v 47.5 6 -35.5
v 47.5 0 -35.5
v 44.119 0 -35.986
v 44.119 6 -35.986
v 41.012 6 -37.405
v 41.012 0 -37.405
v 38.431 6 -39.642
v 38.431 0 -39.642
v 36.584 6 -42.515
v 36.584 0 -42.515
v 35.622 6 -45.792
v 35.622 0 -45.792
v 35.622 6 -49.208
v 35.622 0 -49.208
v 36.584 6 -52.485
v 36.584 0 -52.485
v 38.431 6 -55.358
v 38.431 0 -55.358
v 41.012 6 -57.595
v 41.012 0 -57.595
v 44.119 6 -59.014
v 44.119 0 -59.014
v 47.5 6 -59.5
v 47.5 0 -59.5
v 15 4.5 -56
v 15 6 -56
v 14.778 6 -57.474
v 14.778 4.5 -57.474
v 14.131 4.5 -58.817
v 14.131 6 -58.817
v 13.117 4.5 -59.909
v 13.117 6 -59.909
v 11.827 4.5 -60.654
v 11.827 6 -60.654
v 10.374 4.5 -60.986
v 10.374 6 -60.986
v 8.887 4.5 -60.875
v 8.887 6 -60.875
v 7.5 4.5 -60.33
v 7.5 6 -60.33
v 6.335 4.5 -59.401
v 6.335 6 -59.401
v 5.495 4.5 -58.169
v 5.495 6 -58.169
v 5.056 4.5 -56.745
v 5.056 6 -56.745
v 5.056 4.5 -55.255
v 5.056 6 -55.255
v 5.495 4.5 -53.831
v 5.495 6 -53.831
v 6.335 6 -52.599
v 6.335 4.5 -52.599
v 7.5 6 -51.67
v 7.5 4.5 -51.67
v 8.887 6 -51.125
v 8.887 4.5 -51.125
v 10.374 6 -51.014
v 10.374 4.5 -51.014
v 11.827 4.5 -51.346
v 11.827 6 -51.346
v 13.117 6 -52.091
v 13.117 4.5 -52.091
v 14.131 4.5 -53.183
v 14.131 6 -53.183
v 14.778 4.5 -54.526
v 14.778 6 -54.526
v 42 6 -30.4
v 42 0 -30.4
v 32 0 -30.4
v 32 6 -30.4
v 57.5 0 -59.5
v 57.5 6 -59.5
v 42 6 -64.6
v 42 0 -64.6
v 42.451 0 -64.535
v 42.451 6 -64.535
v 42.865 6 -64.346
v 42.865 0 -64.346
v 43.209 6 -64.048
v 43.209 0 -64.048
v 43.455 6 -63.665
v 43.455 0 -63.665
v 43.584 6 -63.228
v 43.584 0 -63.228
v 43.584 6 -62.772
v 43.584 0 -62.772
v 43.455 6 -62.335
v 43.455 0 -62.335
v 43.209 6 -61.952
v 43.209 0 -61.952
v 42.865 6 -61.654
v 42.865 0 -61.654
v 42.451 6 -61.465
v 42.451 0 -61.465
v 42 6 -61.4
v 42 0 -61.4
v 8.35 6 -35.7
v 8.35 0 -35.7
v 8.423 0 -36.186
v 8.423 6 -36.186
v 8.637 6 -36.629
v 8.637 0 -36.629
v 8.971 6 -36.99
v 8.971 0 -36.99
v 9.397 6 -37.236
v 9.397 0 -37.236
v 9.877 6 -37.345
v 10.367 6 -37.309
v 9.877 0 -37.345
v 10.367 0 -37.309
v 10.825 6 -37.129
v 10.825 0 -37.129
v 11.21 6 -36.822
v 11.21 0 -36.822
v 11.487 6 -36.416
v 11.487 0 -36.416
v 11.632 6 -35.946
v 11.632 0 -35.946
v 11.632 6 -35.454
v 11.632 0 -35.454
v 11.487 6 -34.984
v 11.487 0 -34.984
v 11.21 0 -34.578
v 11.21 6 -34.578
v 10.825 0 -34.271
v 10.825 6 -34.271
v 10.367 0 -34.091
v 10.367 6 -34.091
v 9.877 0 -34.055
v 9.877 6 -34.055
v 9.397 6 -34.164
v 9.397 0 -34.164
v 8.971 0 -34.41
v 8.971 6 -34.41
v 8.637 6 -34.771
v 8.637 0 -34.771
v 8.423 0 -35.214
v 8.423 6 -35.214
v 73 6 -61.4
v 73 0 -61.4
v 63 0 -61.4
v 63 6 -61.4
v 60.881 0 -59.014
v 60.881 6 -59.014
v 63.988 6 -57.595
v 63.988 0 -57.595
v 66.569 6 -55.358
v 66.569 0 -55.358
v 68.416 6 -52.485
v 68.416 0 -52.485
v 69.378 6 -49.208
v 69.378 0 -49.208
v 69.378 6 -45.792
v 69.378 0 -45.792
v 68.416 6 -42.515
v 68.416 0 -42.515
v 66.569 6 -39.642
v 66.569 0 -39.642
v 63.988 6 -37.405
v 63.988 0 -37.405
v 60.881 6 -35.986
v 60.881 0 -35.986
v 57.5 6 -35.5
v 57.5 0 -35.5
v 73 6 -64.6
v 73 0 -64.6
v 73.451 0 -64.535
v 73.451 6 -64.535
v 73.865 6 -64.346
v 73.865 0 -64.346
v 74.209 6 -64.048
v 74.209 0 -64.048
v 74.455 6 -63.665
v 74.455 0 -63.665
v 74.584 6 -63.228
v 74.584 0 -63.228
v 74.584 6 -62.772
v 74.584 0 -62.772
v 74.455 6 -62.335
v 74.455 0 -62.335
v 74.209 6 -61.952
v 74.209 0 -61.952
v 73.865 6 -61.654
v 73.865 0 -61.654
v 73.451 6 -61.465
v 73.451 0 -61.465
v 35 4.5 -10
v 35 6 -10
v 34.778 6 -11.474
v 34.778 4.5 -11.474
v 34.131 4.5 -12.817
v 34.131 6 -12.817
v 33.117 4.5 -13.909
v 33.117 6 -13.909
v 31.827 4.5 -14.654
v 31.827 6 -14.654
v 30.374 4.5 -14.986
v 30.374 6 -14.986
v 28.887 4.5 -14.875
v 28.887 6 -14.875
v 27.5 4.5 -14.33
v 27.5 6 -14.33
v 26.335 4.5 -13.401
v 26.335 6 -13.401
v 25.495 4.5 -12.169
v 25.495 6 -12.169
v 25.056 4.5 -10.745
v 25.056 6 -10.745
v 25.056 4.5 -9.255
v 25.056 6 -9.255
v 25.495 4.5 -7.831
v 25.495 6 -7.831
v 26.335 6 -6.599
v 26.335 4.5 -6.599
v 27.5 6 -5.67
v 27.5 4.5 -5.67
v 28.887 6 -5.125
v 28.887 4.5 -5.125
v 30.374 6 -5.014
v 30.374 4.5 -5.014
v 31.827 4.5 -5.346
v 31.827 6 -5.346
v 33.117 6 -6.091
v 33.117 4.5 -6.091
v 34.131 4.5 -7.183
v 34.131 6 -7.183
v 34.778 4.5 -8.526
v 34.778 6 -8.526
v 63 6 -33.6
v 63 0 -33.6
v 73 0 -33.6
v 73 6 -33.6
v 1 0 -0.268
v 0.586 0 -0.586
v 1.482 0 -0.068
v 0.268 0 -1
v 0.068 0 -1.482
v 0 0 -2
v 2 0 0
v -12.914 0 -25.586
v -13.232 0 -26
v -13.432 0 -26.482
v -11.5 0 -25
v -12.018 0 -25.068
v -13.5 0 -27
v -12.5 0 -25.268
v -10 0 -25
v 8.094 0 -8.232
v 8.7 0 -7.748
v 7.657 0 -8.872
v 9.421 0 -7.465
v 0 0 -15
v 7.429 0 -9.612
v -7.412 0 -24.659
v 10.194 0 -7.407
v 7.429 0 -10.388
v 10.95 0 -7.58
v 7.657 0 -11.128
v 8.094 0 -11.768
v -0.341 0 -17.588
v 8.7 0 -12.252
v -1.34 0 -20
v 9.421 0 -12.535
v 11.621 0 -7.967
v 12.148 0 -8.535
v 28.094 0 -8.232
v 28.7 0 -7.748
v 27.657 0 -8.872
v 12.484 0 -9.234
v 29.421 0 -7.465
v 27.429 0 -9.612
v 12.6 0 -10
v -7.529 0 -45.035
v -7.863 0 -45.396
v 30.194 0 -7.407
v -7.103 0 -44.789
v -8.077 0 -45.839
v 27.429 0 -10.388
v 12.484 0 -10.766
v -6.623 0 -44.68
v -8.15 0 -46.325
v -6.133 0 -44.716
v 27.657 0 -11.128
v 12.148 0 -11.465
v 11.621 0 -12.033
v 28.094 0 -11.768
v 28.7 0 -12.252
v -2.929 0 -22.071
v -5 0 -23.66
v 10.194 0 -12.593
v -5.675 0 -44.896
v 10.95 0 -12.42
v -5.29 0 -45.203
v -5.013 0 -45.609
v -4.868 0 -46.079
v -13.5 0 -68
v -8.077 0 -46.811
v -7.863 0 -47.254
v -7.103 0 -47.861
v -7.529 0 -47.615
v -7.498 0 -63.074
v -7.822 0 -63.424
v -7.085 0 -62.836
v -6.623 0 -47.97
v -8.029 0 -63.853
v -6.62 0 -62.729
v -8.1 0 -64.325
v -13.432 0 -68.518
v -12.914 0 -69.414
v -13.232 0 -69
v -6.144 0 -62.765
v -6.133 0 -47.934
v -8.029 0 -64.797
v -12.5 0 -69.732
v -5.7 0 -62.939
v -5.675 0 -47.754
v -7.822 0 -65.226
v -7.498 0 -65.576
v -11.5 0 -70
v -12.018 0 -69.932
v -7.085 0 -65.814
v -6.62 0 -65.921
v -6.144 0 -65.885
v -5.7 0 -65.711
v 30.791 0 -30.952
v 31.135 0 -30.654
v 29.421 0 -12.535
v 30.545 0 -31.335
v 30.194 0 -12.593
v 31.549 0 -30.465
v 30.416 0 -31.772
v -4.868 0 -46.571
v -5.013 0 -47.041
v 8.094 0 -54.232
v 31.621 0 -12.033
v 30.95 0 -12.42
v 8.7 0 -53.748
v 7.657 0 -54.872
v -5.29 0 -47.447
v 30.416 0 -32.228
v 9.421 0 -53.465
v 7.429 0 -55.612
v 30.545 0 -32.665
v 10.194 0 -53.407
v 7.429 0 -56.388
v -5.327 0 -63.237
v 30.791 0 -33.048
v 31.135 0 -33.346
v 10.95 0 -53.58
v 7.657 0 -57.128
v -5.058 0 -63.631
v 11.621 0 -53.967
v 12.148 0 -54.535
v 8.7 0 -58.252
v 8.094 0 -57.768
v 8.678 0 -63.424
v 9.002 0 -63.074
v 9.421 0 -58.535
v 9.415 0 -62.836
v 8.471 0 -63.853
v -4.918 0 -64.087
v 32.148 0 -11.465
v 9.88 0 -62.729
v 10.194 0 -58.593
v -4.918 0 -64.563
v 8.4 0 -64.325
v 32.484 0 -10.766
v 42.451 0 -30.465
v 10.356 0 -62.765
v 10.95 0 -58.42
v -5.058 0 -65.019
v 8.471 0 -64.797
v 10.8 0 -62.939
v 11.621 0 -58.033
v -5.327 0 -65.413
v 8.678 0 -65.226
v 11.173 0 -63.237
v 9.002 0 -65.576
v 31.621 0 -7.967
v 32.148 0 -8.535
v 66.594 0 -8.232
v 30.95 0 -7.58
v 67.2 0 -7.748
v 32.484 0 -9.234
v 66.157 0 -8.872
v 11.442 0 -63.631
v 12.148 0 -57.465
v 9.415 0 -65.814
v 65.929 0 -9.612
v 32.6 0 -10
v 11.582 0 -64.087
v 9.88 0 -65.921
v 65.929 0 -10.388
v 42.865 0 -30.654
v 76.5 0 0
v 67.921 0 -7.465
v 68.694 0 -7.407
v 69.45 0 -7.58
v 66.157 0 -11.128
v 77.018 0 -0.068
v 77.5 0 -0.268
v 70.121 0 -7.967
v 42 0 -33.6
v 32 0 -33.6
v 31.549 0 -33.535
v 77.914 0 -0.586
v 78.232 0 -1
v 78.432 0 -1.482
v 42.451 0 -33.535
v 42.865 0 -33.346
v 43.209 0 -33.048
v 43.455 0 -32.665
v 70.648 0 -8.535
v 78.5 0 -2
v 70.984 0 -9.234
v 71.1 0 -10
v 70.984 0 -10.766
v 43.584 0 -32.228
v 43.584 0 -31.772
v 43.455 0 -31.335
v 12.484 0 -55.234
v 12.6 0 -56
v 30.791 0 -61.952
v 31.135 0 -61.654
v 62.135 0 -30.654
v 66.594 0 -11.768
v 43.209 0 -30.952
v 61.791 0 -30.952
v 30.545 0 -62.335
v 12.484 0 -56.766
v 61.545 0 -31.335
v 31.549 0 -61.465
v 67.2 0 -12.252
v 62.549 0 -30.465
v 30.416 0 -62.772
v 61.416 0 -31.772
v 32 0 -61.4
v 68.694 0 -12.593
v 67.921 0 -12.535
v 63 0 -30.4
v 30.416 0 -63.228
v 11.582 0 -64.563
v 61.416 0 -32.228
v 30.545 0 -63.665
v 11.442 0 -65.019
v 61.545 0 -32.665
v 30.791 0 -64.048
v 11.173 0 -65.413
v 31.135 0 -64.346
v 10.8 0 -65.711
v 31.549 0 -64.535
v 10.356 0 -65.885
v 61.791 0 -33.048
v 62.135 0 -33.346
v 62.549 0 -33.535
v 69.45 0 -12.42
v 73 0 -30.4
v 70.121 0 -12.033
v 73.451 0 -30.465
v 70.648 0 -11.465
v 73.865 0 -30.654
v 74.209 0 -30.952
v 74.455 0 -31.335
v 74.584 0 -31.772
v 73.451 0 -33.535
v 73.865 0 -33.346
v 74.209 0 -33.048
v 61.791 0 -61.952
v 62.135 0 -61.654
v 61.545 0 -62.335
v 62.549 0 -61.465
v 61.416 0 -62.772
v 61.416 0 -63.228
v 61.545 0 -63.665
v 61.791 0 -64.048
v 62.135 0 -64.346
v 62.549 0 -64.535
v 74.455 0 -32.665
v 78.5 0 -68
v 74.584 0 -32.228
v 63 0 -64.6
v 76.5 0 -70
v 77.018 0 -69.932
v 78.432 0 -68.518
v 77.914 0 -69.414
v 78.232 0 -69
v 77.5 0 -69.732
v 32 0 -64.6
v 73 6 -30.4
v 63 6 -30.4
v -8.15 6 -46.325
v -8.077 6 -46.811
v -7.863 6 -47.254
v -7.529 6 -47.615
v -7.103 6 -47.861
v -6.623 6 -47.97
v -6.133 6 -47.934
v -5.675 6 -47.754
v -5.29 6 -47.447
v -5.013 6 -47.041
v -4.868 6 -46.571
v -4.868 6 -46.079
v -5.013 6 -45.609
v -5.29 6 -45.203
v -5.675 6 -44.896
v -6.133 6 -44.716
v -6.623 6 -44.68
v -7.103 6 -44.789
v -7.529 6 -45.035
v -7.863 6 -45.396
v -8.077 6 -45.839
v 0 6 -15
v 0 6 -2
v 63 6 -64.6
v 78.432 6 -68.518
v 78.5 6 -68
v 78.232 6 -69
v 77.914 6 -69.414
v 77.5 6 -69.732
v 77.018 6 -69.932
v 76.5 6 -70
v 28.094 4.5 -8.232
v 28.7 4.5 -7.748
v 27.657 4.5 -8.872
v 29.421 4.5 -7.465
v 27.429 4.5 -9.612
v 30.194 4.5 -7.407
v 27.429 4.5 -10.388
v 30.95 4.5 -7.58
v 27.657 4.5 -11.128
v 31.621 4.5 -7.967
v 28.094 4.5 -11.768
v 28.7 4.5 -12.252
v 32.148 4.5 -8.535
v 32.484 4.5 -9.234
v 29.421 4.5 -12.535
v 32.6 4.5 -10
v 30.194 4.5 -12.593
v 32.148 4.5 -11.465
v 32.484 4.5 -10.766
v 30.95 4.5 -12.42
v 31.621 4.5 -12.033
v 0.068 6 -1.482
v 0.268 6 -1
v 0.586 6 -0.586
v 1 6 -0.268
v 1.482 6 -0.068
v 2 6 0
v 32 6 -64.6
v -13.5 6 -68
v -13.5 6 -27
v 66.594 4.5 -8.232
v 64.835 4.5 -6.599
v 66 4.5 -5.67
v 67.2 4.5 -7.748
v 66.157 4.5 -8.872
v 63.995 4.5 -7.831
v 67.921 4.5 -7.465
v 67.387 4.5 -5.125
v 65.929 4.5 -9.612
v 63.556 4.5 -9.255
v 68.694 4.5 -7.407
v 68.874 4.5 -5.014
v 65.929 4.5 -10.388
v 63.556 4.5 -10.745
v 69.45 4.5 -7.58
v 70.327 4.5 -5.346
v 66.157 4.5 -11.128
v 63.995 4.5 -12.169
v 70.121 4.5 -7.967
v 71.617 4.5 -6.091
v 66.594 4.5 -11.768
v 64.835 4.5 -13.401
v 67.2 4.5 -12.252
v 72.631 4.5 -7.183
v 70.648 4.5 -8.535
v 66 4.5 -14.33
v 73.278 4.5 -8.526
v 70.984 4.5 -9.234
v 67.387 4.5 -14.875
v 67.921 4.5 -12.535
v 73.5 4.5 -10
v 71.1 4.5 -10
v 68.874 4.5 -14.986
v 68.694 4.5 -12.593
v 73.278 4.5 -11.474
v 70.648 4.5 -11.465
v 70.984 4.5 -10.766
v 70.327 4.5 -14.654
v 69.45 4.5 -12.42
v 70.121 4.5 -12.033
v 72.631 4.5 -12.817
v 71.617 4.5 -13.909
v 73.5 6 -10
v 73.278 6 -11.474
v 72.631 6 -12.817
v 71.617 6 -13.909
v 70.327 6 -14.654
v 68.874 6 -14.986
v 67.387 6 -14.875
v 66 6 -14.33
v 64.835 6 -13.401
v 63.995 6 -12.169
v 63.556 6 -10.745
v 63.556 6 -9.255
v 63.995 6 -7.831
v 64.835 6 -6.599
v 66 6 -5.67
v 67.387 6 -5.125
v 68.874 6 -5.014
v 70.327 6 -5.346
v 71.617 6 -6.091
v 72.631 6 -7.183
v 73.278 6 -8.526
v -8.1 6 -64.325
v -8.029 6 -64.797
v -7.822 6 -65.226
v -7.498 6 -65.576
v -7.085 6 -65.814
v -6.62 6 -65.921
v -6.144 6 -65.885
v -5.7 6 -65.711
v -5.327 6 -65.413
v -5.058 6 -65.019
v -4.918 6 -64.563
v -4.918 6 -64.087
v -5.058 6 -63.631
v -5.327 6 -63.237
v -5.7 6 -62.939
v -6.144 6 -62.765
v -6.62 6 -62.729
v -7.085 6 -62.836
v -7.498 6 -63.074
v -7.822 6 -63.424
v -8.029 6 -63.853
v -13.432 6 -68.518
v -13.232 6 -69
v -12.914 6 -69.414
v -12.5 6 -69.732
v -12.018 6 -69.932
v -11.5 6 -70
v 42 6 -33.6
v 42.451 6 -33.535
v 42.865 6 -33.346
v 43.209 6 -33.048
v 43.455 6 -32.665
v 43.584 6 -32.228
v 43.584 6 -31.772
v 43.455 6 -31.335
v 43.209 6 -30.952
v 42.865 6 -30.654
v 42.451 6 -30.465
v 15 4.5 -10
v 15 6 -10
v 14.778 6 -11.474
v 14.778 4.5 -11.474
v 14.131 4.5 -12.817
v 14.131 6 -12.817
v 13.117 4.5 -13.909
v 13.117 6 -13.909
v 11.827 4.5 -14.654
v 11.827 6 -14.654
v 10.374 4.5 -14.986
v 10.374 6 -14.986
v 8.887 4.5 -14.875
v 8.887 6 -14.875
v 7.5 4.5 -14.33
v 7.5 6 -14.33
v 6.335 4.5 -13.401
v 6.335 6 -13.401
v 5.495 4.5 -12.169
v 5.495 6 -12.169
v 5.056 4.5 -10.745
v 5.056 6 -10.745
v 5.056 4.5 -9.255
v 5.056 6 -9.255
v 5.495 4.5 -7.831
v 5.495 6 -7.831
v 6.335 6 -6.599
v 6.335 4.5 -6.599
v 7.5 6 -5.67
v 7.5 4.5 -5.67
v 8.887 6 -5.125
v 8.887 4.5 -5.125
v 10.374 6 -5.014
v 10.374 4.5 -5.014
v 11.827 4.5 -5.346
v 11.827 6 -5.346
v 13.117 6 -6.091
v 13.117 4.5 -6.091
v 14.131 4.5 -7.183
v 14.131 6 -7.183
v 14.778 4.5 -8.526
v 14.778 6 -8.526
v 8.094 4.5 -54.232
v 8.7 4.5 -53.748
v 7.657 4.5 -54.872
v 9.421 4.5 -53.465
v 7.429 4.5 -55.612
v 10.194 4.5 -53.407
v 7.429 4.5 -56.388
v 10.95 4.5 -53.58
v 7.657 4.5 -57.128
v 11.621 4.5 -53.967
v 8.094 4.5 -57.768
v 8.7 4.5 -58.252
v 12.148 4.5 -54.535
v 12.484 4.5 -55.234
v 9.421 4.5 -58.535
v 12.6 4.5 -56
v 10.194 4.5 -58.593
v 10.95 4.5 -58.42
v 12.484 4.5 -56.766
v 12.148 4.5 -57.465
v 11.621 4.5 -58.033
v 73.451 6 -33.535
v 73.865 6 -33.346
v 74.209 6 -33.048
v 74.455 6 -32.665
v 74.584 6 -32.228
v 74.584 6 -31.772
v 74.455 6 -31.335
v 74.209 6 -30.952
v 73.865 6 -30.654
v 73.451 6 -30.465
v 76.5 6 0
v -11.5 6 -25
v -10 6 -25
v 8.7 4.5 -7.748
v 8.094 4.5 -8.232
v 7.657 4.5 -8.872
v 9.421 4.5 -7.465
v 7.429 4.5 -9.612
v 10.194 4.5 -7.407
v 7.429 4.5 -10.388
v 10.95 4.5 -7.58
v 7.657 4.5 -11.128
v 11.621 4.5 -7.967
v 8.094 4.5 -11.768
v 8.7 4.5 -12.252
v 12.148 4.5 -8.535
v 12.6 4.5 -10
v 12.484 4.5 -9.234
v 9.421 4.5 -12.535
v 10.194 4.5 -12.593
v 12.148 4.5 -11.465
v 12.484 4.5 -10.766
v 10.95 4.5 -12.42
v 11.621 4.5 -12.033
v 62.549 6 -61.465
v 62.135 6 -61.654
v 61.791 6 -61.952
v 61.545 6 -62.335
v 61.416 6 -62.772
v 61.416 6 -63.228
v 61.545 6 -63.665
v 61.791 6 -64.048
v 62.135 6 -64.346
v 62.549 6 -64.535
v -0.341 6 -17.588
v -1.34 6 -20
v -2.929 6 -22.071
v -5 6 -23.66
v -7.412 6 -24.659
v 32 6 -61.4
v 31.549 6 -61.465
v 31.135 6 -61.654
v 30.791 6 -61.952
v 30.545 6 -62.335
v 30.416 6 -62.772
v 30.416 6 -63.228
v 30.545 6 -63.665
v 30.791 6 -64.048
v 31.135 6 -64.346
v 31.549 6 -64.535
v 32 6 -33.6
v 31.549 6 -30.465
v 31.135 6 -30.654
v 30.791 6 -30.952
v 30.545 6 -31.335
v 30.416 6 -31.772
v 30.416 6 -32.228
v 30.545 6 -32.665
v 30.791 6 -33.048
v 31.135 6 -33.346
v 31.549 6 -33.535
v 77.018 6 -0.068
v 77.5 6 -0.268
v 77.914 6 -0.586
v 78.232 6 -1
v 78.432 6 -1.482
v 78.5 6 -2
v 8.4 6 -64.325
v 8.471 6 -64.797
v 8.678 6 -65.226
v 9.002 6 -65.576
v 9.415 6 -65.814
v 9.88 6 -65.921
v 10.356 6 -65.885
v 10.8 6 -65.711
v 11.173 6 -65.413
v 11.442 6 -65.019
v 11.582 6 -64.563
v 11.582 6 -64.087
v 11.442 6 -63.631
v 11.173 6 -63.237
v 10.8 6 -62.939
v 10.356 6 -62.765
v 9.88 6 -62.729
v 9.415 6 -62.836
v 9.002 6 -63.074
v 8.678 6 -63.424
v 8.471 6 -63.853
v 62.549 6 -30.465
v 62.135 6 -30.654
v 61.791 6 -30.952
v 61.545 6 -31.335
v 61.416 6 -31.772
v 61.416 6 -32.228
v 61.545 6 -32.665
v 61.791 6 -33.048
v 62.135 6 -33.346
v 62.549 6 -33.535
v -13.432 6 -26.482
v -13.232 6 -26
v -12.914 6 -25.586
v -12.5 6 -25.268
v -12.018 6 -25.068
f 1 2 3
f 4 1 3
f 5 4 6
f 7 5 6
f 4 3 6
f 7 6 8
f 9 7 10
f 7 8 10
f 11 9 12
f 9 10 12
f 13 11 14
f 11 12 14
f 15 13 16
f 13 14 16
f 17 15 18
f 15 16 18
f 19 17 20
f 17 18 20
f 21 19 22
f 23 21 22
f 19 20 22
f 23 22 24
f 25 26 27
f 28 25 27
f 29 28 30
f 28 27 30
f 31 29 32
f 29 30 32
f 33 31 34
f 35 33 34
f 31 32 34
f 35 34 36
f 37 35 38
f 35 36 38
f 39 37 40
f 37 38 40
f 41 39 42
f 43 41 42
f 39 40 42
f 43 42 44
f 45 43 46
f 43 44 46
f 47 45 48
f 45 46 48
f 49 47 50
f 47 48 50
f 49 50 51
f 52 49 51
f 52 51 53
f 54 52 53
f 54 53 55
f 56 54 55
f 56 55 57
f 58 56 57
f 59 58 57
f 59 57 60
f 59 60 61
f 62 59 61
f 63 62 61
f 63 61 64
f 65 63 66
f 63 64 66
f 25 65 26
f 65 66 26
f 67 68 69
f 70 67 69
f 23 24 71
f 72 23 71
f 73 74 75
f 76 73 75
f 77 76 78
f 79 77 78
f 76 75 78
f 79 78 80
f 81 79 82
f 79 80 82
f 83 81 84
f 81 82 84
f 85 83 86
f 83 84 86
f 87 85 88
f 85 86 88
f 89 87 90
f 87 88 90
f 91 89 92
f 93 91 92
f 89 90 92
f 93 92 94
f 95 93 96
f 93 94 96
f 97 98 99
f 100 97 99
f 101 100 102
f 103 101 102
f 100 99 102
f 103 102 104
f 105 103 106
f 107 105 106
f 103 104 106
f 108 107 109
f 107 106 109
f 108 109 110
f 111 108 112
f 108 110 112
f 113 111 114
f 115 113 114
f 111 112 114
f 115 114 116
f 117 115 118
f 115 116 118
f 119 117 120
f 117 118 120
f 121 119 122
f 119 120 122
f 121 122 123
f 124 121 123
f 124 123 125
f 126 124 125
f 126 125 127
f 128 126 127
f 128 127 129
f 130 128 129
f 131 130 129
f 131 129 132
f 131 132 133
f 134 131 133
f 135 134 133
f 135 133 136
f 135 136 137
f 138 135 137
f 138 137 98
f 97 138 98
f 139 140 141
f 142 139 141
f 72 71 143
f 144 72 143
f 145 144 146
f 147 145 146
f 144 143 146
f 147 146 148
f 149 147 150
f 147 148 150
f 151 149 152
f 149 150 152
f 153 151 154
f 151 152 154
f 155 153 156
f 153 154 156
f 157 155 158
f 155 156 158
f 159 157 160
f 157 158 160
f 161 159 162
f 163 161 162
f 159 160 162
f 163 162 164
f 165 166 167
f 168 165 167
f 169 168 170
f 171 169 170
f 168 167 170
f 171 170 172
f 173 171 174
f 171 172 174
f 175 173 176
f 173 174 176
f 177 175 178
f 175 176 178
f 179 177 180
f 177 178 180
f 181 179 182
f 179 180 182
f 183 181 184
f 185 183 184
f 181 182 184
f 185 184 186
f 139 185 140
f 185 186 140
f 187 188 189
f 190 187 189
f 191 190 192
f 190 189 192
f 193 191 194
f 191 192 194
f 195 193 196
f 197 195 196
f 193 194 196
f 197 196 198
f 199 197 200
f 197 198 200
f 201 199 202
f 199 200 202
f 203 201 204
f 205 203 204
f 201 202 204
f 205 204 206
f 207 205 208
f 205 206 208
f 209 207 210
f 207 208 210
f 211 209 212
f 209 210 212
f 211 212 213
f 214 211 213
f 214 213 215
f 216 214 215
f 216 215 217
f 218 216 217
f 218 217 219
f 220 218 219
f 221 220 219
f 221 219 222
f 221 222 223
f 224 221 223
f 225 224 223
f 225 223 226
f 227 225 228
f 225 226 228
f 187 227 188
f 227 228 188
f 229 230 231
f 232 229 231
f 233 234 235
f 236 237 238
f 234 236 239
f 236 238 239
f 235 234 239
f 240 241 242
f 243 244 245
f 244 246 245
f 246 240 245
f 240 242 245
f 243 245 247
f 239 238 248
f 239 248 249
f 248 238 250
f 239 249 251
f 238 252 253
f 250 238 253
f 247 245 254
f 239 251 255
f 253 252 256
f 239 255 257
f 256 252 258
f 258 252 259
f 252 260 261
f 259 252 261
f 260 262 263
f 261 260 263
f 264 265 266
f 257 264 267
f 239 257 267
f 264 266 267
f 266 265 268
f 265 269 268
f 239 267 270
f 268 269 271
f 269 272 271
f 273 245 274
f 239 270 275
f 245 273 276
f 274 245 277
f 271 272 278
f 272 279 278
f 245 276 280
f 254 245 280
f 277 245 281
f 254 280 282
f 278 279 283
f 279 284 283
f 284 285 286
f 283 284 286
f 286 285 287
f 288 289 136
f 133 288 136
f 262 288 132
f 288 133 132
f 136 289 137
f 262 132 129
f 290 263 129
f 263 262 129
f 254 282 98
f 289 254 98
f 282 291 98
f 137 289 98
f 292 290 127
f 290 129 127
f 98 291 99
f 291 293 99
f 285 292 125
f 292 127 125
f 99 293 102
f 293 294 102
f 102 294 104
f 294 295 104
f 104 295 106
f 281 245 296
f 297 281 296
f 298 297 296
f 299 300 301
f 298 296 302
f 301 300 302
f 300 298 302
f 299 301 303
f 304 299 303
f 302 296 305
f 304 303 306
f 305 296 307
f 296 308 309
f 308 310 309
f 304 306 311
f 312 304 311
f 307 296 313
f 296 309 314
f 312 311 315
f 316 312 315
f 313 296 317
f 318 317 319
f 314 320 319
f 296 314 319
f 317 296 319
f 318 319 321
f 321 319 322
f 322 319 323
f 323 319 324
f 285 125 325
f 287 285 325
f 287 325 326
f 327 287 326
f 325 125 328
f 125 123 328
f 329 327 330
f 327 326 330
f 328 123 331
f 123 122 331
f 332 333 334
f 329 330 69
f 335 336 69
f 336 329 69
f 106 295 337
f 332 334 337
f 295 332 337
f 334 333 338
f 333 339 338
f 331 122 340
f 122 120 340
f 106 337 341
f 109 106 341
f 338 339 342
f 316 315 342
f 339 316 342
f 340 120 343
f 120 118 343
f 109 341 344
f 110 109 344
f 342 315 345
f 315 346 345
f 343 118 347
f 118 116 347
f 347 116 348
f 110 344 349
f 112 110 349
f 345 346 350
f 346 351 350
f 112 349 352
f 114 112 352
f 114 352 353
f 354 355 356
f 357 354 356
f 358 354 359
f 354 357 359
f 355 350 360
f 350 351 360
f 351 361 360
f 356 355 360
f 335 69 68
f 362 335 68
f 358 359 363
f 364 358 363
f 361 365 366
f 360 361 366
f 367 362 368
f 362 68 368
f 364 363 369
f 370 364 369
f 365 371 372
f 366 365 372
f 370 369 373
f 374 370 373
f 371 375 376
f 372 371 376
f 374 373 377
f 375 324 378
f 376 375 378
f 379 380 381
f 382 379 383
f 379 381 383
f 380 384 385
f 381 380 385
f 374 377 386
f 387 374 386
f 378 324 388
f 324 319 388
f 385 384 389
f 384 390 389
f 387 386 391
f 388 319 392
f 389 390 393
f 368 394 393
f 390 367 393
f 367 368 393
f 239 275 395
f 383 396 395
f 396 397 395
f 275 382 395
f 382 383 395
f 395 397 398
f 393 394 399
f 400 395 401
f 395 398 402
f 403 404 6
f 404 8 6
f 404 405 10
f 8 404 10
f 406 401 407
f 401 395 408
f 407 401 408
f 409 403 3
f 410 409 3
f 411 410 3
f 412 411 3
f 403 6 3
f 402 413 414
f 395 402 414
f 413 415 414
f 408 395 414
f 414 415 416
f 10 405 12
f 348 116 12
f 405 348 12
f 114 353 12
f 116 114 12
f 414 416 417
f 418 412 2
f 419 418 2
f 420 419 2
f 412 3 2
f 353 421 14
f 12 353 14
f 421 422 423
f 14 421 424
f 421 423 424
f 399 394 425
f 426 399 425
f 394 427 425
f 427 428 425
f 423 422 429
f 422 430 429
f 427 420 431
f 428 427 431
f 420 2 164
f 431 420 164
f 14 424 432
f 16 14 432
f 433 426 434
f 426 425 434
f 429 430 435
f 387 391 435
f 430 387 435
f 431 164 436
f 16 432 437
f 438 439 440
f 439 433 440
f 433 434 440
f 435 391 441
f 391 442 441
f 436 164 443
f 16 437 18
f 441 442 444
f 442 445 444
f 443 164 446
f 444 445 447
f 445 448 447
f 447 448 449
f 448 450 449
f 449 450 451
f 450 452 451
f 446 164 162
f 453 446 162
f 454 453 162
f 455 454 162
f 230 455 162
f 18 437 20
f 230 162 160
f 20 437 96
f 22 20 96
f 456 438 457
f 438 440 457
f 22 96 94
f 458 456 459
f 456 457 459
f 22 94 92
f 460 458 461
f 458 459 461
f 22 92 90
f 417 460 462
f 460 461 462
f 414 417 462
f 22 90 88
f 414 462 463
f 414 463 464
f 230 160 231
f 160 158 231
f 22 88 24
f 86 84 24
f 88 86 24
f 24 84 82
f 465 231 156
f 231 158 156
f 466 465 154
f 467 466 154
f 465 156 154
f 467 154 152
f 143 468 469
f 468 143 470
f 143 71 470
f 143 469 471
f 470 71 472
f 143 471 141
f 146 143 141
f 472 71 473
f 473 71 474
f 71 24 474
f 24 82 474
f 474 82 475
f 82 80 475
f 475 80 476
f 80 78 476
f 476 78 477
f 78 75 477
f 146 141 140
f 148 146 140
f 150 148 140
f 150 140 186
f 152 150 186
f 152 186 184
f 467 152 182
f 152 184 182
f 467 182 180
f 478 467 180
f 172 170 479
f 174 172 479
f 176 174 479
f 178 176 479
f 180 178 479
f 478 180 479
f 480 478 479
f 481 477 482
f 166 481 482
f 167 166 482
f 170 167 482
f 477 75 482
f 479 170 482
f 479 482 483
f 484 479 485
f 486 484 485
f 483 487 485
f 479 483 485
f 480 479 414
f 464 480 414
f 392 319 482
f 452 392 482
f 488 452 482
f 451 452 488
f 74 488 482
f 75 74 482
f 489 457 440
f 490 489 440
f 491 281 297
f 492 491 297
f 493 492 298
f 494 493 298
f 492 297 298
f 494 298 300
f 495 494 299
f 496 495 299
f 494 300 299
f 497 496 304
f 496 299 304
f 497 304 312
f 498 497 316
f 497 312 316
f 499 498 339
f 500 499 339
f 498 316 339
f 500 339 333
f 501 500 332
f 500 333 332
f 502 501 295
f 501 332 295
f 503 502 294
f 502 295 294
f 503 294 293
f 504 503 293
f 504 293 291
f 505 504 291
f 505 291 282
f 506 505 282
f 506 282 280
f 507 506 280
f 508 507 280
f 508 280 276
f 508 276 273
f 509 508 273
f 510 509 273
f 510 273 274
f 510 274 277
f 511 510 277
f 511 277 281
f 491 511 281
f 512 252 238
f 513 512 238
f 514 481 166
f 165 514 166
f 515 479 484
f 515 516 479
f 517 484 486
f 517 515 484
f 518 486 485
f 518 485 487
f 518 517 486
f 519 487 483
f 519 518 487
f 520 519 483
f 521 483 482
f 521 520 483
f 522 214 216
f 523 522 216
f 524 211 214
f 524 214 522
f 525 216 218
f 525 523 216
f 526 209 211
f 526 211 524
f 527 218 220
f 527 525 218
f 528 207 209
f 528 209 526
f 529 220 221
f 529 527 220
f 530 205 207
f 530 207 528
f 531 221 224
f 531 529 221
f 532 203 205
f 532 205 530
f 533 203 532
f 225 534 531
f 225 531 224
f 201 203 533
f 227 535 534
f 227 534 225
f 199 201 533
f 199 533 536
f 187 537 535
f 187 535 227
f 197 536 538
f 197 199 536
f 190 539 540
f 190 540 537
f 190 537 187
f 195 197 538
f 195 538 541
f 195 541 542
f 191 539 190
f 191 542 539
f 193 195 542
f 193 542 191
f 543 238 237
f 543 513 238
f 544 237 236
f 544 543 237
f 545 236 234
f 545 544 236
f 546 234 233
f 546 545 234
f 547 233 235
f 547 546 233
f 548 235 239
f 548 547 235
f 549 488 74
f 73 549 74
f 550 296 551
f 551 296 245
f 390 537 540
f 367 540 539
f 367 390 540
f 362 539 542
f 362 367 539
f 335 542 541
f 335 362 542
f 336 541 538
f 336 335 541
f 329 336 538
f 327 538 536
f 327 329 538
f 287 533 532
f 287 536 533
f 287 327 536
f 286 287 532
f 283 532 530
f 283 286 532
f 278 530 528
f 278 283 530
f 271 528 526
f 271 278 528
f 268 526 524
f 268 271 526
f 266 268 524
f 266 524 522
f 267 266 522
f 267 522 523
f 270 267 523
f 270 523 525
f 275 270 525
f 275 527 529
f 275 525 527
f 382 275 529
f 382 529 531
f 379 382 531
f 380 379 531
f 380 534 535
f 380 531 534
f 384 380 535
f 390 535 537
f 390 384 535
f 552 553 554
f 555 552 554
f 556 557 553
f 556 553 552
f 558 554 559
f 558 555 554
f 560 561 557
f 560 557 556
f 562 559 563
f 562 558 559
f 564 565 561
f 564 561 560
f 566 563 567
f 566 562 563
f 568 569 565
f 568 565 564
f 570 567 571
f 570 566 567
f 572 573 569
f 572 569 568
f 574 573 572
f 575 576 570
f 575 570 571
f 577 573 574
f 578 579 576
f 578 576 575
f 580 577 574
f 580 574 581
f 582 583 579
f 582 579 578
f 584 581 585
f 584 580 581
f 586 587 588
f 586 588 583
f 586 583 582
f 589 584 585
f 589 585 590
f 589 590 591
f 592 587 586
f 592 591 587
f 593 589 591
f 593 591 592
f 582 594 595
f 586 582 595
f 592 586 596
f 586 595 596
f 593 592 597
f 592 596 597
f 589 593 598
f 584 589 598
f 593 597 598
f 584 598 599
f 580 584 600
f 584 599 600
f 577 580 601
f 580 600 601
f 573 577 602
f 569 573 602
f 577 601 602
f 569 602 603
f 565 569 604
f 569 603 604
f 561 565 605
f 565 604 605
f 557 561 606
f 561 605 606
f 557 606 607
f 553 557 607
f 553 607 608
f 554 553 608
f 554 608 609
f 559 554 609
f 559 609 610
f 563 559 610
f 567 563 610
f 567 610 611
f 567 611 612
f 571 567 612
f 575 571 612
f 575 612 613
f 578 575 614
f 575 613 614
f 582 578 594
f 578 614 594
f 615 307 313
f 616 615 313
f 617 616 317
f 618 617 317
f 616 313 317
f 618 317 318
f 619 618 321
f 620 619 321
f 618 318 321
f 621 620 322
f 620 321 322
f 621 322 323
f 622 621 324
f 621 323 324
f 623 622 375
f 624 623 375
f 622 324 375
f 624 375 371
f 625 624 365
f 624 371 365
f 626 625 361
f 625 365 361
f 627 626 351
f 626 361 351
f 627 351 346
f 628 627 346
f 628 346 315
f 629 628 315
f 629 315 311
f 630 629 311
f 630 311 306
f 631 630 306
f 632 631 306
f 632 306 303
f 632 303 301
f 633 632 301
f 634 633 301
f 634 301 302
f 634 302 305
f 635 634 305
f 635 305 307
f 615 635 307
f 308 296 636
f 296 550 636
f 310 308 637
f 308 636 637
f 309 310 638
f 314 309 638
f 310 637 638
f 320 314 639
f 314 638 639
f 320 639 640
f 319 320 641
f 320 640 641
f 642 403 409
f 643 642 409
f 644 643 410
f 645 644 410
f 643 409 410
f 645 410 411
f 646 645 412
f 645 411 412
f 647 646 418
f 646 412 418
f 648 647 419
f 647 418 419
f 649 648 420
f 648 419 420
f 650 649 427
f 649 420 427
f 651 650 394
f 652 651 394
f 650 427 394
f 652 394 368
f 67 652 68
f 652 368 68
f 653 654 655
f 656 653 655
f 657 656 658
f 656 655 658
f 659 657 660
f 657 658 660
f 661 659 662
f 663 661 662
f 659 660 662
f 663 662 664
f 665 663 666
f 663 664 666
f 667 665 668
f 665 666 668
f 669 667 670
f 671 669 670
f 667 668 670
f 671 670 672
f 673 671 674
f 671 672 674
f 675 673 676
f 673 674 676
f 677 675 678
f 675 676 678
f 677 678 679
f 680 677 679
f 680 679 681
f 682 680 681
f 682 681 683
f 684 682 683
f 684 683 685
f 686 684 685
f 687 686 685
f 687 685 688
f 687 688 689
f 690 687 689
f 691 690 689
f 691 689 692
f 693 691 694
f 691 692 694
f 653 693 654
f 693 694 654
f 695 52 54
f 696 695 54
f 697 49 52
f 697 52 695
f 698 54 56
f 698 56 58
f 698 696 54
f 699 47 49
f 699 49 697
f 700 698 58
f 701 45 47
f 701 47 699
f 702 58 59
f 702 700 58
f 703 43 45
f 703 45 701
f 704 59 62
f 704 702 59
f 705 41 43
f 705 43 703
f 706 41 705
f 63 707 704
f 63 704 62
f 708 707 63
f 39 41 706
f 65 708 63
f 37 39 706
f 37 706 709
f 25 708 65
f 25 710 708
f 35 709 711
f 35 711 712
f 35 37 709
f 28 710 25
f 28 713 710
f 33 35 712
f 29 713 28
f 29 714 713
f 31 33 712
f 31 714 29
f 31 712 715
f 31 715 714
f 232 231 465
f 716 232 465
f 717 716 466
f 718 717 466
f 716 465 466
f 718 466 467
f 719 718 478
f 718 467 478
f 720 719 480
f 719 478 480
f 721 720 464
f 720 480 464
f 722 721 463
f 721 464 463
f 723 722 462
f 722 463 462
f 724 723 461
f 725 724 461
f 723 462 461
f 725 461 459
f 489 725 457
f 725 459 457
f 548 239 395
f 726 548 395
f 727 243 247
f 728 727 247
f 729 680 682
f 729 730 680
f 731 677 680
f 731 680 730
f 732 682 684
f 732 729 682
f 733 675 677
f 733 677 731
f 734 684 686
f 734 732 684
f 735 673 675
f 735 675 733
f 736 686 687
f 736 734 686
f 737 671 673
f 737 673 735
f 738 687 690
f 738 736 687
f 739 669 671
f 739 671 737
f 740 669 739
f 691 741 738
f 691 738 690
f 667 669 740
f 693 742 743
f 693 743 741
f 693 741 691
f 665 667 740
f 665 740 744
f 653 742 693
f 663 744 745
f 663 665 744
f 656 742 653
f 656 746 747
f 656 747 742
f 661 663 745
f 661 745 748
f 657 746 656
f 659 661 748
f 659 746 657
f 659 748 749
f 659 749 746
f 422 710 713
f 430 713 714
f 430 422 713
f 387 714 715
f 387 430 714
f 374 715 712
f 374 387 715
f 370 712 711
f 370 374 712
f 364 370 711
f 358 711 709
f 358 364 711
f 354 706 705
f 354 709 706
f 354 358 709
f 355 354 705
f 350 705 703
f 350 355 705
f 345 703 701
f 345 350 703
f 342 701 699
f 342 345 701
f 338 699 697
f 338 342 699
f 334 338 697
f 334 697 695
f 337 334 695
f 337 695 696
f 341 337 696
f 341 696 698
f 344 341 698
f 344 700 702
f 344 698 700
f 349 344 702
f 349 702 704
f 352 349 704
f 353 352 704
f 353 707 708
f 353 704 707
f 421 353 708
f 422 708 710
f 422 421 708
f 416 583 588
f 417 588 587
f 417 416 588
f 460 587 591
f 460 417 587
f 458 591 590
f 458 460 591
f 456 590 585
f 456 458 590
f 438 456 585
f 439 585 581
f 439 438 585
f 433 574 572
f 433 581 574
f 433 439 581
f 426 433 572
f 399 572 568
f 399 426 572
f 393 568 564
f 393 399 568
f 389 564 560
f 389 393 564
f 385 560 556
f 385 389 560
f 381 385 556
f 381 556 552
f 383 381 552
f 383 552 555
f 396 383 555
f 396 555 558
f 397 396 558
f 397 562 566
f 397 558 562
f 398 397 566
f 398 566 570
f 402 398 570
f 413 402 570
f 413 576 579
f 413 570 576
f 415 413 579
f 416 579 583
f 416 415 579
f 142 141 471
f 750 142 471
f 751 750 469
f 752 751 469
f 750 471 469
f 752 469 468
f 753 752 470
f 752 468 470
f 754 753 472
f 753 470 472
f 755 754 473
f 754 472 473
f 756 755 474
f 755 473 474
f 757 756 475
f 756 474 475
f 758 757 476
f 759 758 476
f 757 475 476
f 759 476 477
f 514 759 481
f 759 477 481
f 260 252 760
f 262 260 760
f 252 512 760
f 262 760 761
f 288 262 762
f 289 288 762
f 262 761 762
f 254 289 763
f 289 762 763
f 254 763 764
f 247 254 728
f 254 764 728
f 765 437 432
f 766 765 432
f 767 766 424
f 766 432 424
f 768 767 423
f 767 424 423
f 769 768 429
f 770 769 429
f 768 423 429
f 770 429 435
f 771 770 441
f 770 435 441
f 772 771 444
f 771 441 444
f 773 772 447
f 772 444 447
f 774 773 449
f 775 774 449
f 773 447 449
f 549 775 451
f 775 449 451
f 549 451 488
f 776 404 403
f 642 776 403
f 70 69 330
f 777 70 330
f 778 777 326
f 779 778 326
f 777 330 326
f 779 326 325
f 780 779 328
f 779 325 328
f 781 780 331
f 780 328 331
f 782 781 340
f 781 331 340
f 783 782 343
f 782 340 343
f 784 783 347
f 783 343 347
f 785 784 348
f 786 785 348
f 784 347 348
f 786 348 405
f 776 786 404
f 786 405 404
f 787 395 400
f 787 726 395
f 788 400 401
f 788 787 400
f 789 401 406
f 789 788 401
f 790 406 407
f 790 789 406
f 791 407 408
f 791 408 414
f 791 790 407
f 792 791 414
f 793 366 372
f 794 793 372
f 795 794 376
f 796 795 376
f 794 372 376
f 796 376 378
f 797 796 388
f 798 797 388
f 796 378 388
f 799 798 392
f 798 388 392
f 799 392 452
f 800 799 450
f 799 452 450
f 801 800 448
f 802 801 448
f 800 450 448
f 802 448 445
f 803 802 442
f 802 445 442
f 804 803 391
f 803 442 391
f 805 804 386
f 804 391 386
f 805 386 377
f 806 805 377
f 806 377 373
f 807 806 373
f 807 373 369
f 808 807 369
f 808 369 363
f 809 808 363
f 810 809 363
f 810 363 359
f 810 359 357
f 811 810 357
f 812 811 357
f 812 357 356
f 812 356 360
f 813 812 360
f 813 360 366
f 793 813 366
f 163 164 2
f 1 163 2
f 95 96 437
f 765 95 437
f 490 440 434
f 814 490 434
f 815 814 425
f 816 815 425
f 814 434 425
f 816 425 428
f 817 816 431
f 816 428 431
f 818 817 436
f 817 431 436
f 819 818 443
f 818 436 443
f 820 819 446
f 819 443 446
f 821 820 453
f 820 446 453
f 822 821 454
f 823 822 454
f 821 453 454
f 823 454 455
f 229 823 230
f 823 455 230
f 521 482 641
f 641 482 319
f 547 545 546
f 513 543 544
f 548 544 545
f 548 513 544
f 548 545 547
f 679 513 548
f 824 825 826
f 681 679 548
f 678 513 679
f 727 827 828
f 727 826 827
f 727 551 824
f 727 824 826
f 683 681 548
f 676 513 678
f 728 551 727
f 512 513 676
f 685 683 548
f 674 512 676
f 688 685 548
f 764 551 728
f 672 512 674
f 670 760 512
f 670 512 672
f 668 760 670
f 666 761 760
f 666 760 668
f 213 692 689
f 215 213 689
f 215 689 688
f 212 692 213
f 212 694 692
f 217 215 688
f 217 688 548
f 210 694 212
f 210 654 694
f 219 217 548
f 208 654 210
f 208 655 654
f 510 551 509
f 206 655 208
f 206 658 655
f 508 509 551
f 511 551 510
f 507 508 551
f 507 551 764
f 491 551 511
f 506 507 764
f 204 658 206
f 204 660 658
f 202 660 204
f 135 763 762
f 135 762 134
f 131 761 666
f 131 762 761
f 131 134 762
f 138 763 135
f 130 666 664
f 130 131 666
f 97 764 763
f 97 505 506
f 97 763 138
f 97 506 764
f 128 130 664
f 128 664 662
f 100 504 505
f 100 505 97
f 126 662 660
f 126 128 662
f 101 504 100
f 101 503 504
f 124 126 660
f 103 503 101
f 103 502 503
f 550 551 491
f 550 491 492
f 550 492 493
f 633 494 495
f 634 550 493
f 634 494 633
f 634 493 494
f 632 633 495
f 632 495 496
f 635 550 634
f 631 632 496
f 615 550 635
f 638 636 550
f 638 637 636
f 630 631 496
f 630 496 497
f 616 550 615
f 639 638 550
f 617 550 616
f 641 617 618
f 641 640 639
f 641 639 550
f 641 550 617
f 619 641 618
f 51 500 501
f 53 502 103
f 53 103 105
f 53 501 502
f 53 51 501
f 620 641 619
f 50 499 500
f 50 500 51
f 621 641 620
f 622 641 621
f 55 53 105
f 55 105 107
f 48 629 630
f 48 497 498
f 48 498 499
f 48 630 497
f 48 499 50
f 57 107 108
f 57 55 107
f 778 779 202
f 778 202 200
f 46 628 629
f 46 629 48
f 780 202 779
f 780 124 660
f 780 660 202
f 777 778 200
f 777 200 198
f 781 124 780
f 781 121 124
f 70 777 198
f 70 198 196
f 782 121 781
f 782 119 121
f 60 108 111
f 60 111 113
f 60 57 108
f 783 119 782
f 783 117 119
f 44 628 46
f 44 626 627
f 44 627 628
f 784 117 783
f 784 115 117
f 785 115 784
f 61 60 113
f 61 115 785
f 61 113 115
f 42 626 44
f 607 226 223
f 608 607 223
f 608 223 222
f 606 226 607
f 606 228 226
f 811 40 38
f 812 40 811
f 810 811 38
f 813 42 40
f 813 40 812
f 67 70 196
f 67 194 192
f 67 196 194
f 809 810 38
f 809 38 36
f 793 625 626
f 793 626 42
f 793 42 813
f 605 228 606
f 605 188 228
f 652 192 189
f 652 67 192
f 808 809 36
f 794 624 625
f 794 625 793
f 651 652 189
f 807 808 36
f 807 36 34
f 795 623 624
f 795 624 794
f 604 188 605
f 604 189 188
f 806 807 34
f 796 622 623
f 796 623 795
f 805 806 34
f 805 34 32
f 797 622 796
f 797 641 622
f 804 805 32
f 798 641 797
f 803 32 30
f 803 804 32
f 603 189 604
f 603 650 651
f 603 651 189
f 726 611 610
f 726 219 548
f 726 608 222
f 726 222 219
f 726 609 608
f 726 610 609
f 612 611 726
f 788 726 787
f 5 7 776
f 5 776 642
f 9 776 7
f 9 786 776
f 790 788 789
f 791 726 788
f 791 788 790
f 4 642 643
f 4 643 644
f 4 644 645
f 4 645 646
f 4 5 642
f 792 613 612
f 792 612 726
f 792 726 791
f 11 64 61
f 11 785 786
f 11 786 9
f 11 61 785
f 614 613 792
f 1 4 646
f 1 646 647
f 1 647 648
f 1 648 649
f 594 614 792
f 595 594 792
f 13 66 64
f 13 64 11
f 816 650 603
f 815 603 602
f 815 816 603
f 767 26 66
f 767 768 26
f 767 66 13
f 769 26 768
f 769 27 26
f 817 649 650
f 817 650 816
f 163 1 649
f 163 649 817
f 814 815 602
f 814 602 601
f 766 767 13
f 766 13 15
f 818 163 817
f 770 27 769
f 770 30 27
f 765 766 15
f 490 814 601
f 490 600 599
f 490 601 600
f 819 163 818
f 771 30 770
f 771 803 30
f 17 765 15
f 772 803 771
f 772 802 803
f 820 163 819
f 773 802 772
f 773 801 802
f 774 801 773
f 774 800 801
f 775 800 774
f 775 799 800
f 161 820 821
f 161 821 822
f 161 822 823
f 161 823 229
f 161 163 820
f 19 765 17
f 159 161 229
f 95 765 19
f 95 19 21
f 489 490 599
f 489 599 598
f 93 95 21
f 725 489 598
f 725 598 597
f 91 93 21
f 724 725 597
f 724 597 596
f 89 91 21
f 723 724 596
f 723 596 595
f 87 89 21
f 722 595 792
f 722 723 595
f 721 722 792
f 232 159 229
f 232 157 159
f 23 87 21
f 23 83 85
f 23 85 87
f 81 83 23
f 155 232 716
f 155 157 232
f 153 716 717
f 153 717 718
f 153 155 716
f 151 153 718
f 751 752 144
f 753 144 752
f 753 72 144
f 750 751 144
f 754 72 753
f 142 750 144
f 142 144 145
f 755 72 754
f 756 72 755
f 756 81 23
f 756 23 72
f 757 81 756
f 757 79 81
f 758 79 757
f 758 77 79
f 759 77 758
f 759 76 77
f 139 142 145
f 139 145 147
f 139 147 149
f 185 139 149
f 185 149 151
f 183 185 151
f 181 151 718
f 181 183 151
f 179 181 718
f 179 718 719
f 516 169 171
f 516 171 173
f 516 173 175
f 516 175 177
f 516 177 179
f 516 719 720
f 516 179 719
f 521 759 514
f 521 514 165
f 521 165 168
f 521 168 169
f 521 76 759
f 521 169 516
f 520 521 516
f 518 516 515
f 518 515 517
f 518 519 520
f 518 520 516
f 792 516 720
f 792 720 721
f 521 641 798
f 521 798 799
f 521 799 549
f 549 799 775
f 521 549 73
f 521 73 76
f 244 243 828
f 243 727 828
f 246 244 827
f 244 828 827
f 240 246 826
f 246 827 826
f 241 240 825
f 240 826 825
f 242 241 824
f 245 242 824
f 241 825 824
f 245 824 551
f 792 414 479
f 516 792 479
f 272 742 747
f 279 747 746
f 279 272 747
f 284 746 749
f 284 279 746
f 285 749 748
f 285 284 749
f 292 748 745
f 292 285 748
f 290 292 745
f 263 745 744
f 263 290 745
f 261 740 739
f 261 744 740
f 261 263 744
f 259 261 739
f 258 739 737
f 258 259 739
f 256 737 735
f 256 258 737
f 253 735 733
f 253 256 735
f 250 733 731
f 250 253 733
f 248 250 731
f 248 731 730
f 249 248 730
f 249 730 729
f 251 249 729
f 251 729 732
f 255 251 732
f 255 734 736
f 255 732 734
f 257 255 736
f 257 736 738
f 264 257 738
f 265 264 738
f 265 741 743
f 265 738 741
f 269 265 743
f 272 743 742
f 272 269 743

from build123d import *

# Parameters (mm, degrees)
SKETCH3_R             = 2.6
BOSS_EXTRUDE1_DEPTH   = 6
FILLET1_R             = 10
M3_CLEARANCE_HOLE1_D  = 3.2
M4X0_7_TAPPED_HOLE1_D = 3.3
FILLET2_R             = 2
SKETCH5_R             = 5
COUNTERBORE_DEPTH     = 1.5


with BuildPart() as part:
    # Sketch3 → Boss-Extrude1 (new body)
    with BuildSketch(Plane(origin=(0, 0, 0), x_dir=(1, 0, 0), z_dir=(0, 1, 0))):
        Polygon((0, 0), (78.5, 0), (78.5, 70), (0, 70), (-13.5, 70), (-13.5, 25), (0, 25), align=None)
        with Locations((10, 56)):
            Circle(SKETCH3_R, mode=Mode.SUBTRACT)
        with Locations((10, 10)):
            Circle(SKETCH3_R, mode=Mode.SUBTRACT)
        with Locations((68.5, 10)):
            Circle(SKETCH3_R, mode=Mode.SUBTRACT)
        with Locations((30, 10)):
            Circle(SKETCH3_R, mode=Mode.SUBTRACT)
        with BuildLine():
            Line((47.5, 59.5), (57.5, 59.5))
            ThreePointArc((57.5, 59.5), (69.5, 47.5), (57.5, 35.5))
            Line((57.5, 35.5), (47.5, 35.5))
            ThreePointArc((47.5, 35.5), (35.5, 47.5), (47.5, 59.5))
        make_face(mode=Mode.SUBTRACT)
        with BuildLine():
            Line((32, 64.6), (42, 64.6))
            ThreePointArc((42, 64.6), (43.6, 63), (42, 61.4))
            Line((42, 61.4), (32, 61.4))
            ThreePointArc((32, 61.4), (30.4, 63), (32, 64.6))
        make_face(mode=Mode.SUBTRACT)
        with BuildLine():
            Line((63, 64.6), (73, 64.6))
            ThreePointArc((73, 64.6), (74.6, 63), (73, 61.4))
            Line((73, 61.4), (63, 61.4))
            ThreePointArc((63, 61.4), (61.4, 63), (63, 64.6))
        make_face(mode=Mode.SUBTRACT)
        with BuildLine():
            Line((63, 33.6), (73, 33.6))
            ThreePointArc((73, 33.6), (74.6, 32), (73, 30.4))
            Line((73, 30.4), (63, 30.4))
            ThreePointArc((63, 30.4), (61.4, 32), (63, 33.6))
        make_face(mode=Mode.SUBTRACT)
        with BuildLine():
            Line((32, 33.6), (42, 33.6))
            ThreePointArc((42, 33.6), (43.6, 32), (42, 30.4))
            Line((42, 30.4), (32, 30.4))
            ThreePointArc((32, 30.4), (30.4, 32), (32, 33.6))
        make_face(mode=Mode.SUBTRACT)
    extrude(amount=BOSS_EXTRUDE1_DEPTH)

    # Fillet1
    fillet1_edges = [part.edges().sort_by_distance(p)[0] for p in [
        (0, 3, -25),
    ]]
    fillet(fillet1_edges, radius=FILLET1_R)

    # M3 Clearance Hole1 (through all)
    with Locations(Plane(origin=(0, 6, 0), x_dir=(1, 0, 0), z_dir=(0, 1, 0))):
        with Locations((10, 64.325), (-6.5, 64.325)):
            Hole(M3_CLEARANCE_HOLE1_D / 2)

    # M4x0.7 Tapped Hole1 (through all)
    with Locations(Plane(origin=(0, 6, 0), x_dir=(1, 0, 0), z_dir=(0, 1, 0))):
        with Locations((-6.5, 46.325), (10, 35.7)):
            Hole(M4X0_7_TAPPED_HOLE1_D / 2)

    # Fillet2
    fillet2_edges = [part.edges().sort_by_distance(p)[0] for p in [
        (-13.5, 3, -25),
        (-13.5, 3, -70),
        (78.5, 3, -70),
        (78.5, 3, 0),
        (0, 3, 0),
    ]]
    fillet(fillet2_edges, radius=FILLET2_R)

    # Sketch5 → Counterbore (cut)
    with BuildSketch(Plane(origin=(0, 6, 0), x_dir=(1, 0, 0), z_dir=(0, 1, 0))):
        with Locations((10, 56)):
            Circle(SKETCH5_R)
        with Locations((10, 10)):
            Circle(SKETCH5_R)
        with Locations((30, 10)):
            Circle(SKETCH5_R)
        with Locations((68.5, 10)):
            Circle(SKETCH5_R)
    extrude(amount=-COUNTERBORE_DEPTH, mode=Mode.SUBTRACT)


solid = part.part
